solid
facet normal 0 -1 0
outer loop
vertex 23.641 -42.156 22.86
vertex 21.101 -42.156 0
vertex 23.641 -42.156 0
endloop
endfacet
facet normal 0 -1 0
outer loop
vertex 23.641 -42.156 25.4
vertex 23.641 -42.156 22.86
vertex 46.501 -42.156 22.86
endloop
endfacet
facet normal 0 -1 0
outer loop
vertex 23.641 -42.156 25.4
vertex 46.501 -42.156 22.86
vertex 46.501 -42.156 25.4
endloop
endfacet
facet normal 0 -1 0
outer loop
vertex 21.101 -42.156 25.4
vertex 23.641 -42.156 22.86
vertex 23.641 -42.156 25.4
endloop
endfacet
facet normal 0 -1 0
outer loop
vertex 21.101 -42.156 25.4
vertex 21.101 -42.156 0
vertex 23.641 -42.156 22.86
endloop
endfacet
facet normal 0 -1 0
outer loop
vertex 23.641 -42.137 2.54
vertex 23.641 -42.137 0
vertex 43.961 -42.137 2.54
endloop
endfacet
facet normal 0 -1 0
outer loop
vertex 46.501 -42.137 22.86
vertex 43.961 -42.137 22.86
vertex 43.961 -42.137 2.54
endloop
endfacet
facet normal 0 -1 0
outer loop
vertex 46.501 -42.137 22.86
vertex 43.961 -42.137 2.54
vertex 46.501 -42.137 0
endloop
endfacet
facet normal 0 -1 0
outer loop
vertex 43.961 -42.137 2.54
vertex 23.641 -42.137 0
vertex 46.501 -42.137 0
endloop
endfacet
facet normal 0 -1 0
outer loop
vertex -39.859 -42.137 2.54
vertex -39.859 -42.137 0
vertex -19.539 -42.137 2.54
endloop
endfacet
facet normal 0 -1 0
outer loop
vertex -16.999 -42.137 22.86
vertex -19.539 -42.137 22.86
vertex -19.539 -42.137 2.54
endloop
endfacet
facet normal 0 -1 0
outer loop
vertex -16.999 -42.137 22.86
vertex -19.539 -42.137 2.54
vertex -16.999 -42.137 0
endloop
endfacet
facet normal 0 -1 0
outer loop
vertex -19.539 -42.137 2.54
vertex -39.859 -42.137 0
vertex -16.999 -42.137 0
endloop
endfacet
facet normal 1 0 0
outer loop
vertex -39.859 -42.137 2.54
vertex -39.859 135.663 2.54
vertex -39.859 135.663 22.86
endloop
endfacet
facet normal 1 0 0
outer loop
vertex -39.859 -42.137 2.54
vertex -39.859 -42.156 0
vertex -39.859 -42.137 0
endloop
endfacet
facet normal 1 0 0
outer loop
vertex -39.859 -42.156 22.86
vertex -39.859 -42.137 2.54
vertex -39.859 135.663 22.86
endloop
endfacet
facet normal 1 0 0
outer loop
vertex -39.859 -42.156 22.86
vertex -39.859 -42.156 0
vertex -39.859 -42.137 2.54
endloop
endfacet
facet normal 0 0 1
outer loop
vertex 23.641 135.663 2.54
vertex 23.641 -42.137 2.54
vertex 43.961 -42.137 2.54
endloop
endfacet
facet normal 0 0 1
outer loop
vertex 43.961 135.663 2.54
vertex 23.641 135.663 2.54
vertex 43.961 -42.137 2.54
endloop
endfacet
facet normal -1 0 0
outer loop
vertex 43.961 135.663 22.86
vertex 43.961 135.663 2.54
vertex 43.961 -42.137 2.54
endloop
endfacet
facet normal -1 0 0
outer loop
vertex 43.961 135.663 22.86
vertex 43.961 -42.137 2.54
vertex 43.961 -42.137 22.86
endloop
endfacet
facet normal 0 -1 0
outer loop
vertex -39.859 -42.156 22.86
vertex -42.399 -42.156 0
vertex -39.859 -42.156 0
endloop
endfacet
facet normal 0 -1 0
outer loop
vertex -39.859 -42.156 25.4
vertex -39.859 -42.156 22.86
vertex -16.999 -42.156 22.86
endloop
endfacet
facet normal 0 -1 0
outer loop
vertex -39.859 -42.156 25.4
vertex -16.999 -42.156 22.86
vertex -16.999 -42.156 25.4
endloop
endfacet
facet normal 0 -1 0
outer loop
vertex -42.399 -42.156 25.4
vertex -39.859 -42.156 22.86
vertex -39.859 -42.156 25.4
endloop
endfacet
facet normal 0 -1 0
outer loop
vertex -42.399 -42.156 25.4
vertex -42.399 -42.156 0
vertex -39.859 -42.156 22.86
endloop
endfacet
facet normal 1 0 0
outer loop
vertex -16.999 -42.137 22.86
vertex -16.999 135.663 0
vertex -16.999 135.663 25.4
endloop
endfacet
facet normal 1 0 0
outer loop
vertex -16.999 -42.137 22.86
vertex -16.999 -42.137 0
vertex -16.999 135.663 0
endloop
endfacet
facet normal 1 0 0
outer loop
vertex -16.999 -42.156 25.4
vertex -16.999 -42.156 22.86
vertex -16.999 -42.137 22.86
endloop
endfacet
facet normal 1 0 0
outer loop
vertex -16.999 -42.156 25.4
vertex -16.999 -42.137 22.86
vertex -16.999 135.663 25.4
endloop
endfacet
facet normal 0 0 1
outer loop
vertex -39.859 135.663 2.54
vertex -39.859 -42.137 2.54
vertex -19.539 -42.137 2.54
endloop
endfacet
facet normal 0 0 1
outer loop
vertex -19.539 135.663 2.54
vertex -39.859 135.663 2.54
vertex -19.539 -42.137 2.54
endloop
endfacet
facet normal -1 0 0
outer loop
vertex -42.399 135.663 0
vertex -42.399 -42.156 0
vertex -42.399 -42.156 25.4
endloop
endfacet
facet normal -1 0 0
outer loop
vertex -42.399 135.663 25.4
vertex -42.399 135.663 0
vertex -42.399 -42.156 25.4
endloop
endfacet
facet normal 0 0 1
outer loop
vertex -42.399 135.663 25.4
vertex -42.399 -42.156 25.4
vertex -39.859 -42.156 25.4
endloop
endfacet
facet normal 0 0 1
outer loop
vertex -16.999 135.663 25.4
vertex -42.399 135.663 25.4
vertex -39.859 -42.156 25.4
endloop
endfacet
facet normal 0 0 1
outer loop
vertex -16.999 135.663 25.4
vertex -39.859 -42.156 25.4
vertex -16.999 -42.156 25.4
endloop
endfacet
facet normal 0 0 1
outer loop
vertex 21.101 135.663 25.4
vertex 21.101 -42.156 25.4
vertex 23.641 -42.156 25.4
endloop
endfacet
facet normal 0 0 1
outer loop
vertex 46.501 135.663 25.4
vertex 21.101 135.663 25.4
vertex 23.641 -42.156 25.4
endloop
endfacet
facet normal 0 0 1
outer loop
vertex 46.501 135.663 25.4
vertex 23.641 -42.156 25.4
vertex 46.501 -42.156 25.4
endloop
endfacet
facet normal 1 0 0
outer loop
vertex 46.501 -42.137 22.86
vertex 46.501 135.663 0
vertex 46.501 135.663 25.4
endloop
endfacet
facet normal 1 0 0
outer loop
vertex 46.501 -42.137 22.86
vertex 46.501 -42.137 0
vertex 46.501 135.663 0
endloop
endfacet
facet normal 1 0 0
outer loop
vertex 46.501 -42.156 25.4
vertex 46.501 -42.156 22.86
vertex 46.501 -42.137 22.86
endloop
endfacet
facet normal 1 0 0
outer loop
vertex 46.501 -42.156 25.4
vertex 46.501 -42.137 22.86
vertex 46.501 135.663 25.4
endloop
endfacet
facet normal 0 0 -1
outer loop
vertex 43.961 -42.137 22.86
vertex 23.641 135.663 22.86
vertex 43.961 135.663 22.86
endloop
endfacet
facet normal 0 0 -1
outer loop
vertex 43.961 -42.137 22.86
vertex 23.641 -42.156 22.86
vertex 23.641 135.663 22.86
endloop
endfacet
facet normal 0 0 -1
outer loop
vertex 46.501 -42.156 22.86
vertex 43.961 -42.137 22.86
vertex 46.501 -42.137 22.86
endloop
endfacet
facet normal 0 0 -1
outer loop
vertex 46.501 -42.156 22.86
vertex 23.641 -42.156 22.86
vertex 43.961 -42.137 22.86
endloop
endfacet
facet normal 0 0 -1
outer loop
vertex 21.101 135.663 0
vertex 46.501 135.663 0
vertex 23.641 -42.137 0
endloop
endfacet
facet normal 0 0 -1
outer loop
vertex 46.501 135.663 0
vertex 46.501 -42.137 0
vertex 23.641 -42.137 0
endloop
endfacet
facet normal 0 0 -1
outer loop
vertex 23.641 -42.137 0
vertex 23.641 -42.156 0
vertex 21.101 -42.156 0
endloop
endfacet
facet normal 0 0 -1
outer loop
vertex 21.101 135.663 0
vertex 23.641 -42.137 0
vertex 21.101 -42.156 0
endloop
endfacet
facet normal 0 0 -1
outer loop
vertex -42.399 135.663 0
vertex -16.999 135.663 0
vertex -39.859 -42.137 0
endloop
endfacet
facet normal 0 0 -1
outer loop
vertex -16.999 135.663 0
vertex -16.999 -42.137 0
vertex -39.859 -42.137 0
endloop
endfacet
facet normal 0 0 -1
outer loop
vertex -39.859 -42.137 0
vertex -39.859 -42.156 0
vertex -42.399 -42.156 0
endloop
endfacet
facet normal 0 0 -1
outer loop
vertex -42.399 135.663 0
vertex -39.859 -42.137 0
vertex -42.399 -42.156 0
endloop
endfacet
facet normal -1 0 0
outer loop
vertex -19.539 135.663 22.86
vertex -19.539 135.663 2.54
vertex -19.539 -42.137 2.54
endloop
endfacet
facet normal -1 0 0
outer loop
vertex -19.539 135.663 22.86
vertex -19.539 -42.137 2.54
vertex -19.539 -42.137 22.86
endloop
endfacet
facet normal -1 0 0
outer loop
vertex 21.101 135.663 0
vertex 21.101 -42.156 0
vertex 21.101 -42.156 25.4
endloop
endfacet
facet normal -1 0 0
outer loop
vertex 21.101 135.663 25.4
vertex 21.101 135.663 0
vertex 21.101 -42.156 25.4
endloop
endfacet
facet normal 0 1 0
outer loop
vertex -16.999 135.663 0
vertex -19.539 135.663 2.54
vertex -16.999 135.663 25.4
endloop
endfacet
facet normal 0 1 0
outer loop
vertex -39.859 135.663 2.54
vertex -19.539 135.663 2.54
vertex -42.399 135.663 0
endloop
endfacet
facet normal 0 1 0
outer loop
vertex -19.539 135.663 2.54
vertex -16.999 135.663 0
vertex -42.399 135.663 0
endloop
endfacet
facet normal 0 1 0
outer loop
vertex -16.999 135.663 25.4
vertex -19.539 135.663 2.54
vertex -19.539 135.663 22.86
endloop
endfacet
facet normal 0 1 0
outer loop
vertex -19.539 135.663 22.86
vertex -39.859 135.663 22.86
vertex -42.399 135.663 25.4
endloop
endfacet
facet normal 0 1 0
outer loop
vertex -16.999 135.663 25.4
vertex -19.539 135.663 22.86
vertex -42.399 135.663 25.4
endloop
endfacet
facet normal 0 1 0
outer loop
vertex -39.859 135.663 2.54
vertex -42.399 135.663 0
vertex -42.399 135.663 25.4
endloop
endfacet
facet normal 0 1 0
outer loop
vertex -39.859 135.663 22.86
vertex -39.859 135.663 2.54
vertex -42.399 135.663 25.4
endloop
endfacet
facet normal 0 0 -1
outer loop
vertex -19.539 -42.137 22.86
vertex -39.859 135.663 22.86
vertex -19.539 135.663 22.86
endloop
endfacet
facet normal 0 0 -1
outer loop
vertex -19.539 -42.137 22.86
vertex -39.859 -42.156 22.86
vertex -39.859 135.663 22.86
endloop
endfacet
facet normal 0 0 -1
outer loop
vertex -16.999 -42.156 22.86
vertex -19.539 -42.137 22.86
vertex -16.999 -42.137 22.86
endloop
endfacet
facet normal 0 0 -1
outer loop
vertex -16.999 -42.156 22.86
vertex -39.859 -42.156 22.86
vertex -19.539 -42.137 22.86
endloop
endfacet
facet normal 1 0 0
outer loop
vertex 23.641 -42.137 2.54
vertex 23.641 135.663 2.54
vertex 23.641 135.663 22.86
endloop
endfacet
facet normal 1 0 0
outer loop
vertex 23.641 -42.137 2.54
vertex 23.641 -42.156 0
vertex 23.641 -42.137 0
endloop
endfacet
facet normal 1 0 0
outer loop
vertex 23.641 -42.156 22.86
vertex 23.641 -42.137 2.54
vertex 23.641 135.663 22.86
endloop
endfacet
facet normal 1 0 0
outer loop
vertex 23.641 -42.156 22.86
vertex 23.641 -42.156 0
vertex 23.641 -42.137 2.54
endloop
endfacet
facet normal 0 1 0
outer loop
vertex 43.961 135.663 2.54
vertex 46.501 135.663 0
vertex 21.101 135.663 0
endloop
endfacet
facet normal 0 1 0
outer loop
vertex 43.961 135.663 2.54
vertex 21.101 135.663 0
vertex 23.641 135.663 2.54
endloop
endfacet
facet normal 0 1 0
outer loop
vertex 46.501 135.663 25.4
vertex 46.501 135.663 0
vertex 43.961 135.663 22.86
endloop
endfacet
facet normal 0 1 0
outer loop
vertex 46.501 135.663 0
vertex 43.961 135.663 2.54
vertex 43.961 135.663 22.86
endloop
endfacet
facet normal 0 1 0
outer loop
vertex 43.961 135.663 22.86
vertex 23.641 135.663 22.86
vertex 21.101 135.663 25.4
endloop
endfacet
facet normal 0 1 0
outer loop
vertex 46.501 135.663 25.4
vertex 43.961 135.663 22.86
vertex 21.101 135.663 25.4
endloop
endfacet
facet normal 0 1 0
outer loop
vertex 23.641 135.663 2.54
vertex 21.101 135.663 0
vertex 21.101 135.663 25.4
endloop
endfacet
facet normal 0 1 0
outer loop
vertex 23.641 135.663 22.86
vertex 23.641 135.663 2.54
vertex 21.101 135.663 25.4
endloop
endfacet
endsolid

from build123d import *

# Parameters (mm, degrees)
F0_W     = 20.32
F0_H     = 152.4
F1_DEPTH = 2.54
F0_W_2   = 2.54
F2_DEPTH = 25.4
F3_W     = 152.4182725489
F3_H     = 2.54
F4_DEPTH = 22.86
F6_DEPTH = 25.4


with BuildPart() as f1:
    # F0 (on Top) → F1 (new body)
    with BuildSketch(Plane.XY):
        with Locations((-29.6994138837, 34.0627496958)):
            Rectangle(F0_W, F0_H)
    extrude(amount=F1_DEPTH)

    # F0 (on Top) → F2 (join)
    with BuildSketch(Plane.XY):
        Polygon((-39.8594138837, -42.1372503042), (-39.8594138837, 110.2627496958), (-42.3994138837, 110.2627496958), (-42.3994138837, -42.1555228531), (-39.8594138837, -42.1555228531), align=None)
        with Locations((-18.2694138837, 34.0627496958)):
            Rectangle(F0_W_2, F0_H)
    extrude(amount=F2_DEPTH)

    # F3 (on face) → F4 (join)
    with BuildSketch(Plane.YZ.offset(-39.8594138837)):
        with Locations((34.0536134213, 24.13)):
            Rectangle(F3_W, F3_H)
    extrude(amount=F4_DEPTH)


with BuildPart() as f5_1:
    # F5: copy of F1
    add(f1.part.moved(Location((63.5, 0, 0))))

    # F6 (add): a face of the model
    f6_faces = [f5_1.faces().sort_by_distance(p)[0] for p in [
        (33.8005861163, 110.2627496958, 2.1807897552),
    ]]
    extrude(f6_faces, amount=F6_DEPTH)


with BuildPart() as f1_1:
    add(f1.part)

    # F6#2 (add): a face of the model
    f6_2_faces = [f1_1.faces().sort_by_distance(p)[0] for p in [
        (-29.6994138837, 110.2627496958, 2.1807897552),
    ]]
    extrude(f6_2_faces, amount=F6_DEPTH)


solid = Compound([f5_1.part, f1_1.part])
